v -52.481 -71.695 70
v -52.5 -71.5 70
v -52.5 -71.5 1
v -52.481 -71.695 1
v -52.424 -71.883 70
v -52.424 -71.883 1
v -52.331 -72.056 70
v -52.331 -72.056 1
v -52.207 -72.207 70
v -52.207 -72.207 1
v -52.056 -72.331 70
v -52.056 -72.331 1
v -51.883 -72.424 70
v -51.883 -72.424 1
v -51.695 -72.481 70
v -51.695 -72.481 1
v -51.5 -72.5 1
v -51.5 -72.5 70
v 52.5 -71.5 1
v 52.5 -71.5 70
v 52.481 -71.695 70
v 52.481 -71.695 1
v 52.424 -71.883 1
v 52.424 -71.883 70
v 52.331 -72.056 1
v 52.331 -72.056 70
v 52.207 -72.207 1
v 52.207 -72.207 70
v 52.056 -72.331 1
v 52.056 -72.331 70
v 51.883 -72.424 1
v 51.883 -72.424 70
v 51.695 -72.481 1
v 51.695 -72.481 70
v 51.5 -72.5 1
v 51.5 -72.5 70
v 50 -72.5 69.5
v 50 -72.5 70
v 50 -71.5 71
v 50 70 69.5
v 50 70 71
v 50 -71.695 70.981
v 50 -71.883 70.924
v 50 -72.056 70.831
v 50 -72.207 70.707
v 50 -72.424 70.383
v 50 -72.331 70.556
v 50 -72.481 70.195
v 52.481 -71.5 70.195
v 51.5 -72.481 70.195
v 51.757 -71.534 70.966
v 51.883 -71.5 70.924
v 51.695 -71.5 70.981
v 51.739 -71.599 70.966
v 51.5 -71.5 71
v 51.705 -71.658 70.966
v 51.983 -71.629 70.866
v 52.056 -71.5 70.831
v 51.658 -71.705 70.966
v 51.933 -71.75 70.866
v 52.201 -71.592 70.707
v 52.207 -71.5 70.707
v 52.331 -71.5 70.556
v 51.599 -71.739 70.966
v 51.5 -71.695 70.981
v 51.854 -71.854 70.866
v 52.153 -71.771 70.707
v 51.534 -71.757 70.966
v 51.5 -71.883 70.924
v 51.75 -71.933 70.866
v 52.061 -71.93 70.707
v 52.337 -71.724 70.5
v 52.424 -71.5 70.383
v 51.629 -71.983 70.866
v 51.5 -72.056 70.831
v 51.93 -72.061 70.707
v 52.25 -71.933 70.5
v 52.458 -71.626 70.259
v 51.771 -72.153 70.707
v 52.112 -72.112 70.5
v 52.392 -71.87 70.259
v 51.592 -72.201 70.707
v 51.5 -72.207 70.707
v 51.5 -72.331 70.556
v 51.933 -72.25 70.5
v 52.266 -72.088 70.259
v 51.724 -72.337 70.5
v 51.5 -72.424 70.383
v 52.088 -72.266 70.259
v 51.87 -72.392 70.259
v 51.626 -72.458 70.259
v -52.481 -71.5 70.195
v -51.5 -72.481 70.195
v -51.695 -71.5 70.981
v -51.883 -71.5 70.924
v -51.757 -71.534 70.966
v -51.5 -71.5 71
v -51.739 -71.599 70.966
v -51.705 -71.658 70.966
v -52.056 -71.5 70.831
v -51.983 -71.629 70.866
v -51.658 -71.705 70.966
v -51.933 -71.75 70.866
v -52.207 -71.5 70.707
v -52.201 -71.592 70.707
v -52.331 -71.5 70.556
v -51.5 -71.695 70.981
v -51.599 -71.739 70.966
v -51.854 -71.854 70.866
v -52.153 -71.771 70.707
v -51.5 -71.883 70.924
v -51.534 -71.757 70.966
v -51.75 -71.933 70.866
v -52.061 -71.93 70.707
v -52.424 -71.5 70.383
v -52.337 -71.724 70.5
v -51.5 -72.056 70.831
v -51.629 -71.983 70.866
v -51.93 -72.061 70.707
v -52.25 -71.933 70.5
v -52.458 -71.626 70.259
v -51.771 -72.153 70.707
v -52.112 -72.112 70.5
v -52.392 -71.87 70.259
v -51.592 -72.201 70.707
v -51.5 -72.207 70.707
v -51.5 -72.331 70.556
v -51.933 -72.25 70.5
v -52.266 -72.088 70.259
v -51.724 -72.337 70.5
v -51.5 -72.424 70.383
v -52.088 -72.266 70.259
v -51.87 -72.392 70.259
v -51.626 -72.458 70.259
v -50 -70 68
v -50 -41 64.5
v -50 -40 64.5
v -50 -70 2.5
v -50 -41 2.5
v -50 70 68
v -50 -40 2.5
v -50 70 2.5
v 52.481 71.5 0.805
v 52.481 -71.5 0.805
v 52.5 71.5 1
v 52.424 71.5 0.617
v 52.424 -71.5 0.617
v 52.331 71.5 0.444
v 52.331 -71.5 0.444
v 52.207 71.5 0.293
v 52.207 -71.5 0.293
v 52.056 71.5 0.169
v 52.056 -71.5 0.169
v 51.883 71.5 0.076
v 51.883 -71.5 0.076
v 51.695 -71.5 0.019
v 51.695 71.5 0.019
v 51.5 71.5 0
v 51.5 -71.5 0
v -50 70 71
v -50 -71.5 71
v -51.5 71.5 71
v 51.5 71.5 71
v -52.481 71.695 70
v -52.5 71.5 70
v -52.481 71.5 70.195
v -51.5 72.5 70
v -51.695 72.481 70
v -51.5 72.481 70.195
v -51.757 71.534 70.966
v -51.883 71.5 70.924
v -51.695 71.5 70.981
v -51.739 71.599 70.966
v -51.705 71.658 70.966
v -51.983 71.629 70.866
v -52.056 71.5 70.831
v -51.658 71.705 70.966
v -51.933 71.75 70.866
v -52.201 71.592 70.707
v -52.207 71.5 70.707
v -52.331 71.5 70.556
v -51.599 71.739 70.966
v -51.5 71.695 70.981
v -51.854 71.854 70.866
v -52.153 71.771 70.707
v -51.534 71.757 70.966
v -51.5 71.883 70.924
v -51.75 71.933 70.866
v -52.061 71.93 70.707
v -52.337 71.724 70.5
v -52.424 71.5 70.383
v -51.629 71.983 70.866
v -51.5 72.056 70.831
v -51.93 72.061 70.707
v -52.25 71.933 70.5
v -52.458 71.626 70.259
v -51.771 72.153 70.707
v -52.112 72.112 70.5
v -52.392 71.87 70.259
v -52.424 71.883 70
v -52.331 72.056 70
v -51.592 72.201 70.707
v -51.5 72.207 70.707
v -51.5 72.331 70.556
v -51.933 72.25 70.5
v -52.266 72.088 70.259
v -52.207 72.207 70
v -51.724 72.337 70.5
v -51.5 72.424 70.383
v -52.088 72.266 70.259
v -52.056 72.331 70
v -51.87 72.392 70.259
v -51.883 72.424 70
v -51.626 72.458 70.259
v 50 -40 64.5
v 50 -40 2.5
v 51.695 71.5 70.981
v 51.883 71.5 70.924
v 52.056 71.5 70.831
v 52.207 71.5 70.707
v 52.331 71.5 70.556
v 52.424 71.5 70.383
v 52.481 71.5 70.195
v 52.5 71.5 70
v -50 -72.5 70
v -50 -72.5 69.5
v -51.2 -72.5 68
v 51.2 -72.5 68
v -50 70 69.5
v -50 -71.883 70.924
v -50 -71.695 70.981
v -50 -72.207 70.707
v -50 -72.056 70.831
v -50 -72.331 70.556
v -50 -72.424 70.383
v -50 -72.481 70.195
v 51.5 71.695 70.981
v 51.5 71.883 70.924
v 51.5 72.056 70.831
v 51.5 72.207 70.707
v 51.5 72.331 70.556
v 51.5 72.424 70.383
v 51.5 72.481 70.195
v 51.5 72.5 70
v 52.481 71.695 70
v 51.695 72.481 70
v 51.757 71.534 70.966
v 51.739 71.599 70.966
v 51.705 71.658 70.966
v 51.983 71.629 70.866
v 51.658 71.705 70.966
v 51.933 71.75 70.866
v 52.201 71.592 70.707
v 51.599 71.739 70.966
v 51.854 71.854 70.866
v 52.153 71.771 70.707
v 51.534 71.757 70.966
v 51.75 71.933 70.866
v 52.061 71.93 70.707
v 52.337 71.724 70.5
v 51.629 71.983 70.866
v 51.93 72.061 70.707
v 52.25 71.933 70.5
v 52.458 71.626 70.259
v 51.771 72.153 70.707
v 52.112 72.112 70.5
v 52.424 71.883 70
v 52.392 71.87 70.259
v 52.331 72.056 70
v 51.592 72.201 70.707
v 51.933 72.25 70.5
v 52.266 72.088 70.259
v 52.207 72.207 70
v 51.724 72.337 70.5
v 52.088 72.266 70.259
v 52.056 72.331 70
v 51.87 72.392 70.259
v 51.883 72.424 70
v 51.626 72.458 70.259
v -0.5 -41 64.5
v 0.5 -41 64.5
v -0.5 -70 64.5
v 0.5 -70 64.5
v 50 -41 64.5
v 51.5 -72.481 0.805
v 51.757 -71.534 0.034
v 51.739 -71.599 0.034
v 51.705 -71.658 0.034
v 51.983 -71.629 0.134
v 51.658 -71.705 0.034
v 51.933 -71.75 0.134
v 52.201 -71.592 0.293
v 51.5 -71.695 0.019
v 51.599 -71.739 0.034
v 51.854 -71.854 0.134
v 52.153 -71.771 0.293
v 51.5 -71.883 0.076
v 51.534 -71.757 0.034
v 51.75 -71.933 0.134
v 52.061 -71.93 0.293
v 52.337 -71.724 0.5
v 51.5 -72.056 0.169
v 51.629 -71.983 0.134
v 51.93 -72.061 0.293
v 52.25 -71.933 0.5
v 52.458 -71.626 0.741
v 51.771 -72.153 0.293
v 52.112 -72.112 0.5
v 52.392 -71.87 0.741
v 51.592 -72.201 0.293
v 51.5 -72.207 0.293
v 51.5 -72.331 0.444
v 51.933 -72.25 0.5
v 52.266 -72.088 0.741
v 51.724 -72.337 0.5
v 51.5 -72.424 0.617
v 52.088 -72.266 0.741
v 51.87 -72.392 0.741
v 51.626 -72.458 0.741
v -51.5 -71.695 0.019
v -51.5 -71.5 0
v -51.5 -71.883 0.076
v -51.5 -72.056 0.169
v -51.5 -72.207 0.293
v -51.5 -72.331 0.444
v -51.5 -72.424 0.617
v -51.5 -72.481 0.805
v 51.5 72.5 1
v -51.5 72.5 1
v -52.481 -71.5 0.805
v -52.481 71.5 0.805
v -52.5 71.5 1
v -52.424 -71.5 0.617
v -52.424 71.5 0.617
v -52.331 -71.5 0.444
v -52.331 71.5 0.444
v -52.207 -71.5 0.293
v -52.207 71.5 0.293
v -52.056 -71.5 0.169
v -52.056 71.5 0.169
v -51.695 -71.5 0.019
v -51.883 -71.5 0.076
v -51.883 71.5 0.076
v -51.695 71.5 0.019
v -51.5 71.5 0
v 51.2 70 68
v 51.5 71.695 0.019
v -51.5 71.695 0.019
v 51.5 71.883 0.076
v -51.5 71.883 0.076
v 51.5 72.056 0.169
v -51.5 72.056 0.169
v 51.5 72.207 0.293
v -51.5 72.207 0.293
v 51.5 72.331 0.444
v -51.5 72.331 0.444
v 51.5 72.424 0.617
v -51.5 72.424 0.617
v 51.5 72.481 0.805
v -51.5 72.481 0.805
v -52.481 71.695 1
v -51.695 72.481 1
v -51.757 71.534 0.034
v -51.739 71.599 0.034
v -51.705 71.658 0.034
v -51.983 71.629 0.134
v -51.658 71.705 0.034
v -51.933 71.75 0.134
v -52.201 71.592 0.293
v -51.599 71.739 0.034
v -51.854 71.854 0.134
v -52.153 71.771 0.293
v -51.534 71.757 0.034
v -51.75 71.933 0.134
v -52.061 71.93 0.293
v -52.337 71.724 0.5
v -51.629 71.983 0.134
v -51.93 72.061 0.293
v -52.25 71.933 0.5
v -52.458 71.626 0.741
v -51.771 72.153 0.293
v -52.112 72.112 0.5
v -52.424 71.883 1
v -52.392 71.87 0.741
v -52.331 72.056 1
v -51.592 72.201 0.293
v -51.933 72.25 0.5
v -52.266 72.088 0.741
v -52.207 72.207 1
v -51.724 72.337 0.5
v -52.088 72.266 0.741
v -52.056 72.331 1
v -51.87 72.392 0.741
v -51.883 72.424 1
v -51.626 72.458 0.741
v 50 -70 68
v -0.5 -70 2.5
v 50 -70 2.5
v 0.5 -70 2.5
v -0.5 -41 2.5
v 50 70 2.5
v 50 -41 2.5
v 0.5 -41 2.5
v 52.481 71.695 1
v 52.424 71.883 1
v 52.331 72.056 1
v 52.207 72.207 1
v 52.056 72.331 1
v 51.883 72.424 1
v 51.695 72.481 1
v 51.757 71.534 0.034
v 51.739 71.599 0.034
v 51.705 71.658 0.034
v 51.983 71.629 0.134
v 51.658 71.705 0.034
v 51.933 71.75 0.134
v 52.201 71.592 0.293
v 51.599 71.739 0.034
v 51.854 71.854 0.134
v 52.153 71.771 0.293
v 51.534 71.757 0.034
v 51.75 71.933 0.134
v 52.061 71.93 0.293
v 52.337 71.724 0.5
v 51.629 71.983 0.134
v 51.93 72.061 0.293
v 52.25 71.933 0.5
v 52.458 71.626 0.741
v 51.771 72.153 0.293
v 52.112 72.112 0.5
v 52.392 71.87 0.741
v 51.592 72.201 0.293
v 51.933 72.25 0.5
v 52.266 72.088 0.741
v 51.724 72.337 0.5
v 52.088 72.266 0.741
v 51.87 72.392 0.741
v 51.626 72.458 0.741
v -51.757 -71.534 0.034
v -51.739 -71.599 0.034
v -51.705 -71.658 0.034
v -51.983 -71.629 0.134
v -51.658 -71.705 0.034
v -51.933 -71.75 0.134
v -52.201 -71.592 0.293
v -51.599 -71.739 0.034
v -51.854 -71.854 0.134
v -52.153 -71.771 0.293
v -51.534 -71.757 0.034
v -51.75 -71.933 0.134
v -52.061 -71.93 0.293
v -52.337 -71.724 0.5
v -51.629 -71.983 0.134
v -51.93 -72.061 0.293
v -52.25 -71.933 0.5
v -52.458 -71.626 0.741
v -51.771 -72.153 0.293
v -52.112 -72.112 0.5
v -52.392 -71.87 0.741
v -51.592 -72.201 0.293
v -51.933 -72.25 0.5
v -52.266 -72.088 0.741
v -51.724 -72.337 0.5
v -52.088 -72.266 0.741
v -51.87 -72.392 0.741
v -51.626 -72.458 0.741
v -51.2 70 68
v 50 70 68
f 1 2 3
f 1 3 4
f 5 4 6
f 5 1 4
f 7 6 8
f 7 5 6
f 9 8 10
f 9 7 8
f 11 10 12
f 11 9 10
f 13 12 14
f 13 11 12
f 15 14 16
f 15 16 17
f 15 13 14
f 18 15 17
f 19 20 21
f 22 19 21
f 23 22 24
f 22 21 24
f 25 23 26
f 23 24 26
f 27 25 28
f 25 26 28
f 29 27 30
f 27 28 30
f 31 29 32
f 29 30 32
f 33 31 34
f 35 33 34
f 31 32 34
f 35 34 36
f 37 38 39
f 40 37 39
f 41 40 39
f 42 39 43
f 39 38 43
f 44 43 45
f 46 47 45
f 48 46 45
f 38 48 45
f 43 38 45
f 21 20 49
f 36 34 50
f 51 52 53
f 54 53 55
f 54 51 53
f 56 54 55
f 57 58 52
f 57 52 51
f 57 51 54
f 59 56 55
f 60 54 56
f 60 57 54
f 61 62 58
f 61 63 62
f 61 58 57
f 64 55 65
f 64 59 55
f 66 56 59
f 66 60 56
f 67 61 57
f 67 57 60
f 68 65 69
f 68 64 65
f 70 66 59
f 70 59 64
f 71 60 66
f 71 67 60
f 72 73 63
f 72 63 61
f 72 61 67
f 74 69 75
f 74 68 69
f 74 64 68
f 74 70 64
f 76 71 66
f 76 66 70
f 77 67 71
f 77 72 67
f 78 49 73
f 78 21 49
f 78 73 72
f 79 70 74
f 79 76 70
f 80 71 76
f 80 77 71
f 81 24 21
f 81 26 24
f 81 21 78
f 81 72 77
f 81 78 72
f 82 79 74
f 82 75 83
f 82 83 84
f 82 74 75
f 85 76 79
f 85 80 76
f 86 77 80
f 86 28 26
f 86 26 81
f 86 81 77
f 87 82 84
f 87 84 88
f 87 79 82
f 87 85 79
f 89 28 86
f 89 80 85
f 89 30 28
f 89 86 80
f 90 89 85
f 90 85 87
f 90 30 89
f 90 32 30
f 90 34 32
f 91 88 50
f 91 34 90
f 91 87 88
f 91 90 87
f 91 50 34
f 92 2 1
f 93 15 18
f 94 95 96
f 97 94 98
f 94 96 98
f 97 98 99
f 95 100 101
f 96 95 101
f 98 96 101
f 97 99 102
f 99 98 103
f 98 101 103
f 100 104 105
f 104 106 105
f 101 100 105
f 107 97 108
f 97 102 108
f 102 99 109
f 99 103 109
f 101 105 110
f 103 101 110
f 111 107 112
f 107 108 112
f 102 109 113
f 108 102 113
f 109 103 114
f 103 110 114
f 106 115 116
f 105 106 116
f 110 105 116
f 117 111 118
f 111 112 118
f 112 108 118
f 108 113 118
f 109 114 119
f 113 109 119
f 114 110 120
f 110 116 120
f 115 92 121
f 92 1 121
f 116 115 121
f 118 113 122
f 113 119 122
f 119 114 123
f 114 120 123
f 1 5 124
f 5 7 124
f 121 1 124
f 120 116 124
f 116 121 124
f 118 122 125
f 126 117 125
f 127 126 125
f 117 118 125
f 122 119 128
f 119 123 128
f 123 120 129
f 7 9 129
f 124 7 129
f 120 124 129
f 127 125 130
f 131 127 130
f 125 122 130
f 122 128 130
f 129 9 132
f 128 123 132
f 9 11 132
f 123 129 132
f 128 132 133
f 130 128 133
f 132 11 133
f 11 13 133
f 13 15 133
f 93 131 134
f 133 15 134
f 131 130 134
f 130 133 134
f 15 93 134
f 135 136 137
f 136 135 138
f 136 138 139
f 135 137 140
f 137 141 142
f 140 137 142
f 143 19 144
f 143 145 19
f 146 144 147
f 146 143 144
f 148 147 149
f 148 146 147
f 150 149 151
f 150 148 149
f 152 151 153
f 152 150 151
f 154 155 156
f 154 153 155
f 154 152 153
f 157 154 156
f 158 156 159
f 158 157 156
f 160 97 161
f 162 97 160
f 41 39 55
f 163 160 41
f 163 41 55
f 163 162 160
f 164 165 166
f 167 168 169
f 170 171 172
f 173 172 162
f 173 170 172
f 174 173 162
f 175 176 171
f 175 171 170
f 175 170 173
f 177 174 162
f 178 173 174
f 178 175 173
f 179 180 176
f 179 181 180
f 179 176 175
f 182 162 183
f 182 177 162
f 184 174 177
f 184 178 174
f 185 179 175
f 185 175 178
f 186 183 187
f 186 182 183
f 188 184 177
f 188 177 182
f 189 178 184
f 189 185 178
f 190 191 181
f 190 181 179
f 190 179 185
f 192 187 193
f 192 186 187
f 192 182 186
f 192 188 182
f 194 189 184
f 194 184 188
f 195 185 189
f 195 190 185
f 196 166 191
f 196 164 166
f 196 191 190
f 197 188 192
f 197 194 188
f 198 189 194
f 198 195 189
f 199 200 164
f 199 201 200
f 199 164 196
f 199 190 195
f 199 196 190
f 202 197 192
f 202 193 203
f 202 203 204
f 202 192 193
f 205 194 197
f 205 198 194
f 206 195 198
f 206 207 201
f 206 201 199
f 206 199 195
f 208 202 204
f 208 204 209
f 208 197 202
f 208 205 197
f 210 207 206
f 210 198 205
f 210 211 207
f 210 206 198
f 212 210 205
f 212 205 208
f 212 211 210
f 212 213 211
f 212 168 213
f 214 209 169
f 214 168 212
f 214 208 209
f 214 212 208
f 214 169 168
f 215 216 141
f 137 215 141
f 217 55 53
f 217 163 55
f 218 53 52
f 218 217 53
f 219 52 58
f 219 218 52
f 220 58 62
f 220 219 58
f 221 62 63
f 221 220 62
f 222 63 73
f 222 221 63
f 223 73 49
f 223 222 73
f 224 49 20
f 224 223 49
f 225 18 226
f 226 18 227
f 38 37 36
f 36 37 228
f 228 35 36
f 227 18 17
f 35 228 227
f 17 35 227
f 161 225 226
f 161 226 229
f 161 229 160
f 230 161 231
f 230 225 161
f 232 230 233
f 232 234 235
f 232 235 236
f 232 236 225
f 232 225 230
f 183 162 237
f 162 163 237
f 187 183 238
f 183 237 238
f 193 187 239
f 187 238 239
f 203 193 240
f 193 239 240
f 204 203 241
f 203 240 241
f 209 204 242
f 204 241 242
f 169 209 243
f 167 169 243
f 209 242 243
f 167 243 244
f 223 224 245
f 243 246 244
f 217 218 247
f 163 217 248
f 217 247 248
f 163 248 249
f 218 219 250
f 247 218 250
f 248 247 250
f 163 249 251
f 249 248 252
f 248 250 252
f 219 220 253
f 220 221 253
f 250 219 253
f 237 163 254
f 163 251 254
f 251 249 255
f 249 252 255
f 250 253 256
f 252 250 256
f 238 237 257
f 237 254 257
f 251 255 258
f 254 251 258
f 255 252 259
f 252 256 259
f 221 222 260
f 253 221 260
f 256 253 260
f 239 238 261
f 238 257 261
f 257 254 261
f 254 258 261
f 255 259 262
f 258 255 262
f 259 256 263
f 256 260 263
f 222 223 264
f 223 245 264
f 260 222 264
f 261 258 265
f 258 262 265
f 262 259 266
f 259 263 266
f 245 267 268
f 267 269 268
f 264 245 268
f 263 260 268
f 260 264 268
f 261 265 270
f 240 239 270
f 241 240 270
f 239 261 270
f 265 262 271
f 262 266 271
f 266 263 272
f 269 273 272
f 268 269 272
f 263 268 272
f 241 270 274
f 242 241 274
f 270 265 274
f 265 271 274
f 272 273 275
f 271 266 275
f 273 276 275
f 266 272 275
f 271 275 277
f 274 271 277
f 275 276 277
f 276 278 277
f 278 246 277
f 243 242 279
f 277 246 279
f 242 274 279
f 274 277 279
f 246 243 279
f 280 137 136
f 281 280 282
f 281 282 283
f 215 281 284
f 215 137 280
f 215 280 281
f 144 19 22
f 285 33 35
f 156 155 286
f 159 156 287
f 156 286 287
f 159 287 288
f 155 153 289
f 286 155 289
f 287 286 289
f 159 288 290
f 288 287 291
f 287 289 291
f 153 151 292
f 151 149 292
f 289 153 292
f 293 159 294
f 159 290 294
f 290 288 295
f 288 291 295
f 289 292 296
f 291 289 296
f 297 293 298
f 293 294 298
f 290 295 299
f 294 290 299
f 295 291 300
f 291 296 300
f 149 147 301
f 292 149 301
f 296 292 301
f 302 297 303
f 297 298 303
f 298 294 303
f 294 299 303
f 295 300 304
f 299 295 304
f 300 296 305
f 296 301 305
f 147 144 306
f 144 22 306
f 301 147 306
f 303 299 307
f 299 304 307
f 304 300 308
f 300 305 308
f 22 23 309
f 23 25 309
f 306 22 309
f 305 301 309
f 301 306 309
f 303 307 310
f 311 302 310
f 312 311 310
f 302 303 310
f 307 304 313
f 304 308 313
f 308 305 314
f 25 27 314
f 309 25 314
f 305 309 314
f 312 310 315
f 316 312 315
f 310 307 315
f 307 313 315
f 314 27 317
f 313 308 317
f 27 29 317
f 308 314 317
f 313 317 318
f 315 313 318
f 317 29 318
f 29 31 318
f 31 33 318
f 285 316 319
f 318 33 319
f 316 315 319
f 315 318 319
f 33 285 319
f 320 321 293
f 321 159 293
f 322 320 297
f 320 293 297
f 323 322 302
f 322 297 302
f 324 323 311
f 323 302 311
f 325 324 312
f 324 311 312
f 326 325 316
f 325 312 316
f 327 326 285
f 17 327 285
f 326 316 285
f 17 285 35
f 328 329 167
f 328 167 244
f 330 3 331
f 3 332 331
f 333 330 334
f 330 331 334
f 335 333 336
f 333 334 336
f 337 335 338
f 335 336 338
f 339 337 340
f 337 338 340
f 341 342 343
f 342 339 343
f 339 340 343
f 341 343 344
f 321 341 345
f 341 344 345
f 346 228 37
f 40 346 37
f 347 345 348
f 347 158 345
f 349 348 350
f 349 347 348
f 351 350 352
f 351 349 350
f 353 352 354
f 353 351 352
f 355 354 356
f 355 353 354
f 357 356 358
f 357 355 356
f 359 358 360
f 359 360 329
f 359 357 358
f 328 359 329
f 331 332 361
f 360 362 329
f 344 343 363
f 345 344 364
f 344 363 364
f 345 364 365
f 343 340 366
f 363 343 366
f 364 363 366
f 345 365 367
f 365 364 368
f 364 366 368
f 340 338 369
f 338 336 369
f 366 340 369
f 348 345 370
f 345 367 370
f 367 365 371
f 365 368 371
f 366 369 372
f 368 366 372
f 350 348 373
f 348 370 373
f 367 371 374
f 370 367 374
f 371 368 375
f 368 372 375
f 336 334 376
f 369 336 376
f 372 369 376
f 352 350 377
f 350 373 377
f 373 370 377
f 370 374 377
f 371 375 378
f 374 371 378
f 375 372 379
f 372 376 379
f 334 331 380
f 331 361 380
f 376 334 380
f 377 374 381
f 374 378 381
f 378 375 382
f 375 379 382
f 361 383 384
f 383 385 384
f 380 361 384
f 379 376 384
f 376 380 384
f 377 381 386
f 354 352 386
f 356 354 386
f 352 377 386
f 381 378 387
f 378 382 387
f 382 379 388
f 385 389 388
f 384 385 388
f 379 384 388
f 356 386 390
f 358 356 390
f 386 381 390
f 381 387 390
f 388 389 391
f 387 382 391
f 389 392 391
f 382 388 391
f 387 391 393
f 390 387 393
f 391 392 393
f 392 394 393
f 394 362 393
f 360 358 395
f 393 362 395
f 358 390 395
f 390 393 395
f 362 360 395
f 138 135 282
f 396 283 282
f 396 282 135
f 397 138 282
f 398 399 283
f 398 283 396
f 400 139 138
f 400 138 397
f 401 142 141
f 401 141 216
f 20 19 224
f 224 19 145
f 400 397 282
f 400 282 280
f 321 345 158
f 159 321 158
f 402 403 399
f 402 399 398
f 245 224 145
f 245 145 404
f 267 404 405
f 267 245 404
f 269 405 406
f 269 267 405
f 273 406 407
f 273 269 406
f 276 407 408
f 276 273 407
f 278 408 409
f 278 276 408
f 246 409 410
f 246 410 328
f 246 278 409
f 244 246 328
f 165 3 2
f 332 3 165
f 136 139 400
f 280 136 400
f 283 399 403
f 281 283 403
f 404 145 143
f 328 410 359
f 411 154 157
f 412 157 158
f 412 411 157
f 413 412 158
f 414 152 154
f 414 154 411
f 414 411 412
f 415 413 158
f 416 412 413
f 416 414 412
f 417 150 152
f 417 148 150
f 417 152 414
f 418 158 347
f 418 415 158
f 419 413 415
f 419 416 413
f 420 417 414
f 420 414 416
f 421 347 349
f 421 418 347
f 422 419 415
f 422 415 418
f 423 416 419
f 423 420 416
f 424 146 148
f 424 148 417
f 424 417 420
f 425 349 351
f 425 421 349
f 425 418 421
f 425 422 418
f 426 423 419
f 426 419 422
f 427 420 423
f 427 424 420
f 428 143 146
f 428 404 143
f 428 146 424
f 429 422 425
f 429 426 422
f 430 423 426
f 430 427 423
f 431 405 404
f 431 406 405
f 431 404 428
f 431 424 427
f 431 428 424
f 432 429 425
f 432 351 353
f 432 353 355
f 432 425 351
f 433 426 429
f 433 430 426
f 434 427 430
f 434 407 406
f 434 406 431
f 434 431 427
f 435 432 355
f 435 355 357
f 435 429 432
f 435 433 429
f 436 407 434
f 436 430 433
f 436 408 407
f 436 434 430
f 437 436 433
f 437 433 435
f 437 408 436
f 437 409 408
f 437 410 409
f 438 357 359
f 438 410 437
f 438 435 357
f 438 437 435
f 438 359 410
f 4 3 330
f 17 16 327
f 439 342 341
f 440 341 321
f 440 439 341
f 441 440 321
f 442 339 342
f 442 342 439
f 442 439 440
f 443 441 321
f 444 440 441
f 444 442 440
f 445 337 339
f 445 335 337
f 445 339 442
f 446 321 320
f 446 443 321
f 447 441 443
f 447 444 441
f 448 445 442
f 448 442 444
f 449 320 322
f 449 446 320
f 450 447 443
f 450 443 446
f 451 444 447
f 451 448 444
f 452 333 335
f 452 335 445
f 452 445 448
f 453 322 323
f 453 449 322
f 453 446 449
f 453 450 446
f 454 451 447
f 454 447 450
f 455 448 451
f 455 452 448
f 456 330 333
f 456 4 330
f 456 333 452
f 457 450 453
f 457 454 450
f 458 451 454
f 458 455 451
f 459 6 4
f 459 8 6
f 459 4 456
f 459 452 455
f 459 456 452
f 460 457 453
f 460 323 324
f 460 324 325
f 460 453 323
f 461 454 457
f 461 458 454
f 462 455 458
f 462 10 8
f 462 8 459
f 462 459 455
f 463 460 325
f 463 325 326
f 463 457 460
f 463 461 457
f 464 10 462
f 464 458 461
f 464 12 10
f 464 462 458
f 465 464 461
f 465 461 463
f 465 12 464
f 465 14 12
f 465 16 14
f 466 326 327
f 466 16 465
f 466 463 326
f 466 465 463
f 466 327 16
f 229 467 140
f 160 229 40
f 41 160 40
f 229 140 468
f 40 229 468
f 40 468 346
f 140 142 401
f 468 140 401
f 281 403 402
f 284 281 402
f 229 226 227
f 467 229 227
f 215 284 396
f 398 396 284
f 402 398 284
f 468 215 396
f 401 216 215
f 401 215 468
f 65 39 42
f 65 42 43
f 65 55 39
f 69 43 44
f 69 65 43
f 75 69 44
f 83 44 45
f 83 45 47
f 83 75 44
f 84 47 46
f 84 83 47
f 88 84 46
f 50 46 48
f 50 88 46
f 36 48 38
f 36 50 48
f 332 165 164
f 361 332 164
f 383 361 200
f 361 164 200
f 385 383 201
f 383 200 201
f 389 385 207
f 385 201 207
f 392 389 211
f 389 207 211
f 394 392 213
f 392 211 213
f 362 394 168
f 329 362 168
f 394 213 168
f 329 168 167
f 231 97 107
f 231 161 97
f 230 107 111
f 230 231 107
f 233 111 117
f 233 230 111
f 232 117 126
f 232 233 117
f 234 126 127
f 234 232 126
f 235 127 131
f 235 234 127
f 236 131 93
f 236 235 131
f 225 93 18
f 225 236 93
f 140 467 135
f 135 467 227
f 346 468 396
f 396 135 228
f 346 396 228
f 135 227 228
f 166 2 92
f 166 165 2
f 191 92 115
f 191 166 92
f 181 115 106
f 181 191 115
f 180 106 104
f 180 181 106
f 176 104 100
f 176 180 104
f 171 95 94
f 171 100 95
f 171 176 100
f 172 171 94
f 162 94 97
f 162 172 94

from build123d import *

# Parameters (mm, degrees)
F0_W          = 105
F0_H          = 145
F1_DEPTH      = 71
F2_T          = -2.5
F3_W          = 1
F3_H          = 29
F4_DEPTH      = 62
F5_W          = 50
F5_H          = 1.5
F6_DEPTH      = 142.5
F6_DEPTH_BACK = 268
F7_R          = 1


# Not quite as in the source:
# - an extrude ends at something that could not be found from the text; its depth is read off the source's solid


with BuildPart() as f1:
    # F0 (on Top) → F1 (new body)
    with BuildSketch(Plane.XY):
        Rectangle(F0_W, F0_H)
    extrude(amount=F1_DEPTH)

    # F2
    f2_openings = [f1.faces().sort_by_distance(p)[0] for p in [
        (0, 0, 71),
    ]]
    offset(amount=F2_T, openings=f2_openings)

    # F3 (on face) → F4 (join)
    with BuildSketch(Plane.XY.offset(2.5)):
        Polygon((-50, -40), (-50, -41), (-0.5, -41), (0.5, -41), (50, -41), (50, -40), align=None)
        with Locations((0, -55.5)):
            Rectangle(F3_W, F3_H)
    extrude(amount=F4_DEPTH)

    # F5 (on face) → F6 (cut, two sides)
    with BuildSketch(Plane.XZ.offset(72.5)) as f6_sk:
        with Locations((25, 70.25)):
            Rectangle(F5_W, F5_H)
        with Locations((-25, 70.25)):
            Rectangle(F5_W, F5_H)
        Polygon((50, 69.5), (0, 69.5), (0, 68), (51.2, 68), align=None)
        Polygon((0, 68), (0, 69.5), (-50, 69.5), (-51.2, 68), align=None)
    extrude(amount=-F6_DEPTH, mode=Mode.SUBTRACT)
    extrude(f6_sk.sketch, amount=F6_DEPTH_BACK, mode=Mode.SUBTRACT)

    # F7
    f7_edges = [f1.edges().sort_by_distance(p)[0] for p in [
        (52.5, -72.5, 35.5),
        (52.5, 72.5, 35.5),
        (52.5, 0, 0),
        (52.5, 0, 71),
        (-52.5, 72.5, 35.5),
        (-52.5, -72.5, 35.5),
        (-52.5, 0, 0),
        (-52.5, 0, 71),
        (0, 72.5, 0),
        (0, 72.5, 71),
        (0, -72.5, 0),
        (-51.25, -72.5, 71),
        (51.25, -72.5, 71),
    ]]
    fillet(f7_edges, radius=F7_R)


solid = f1.part
